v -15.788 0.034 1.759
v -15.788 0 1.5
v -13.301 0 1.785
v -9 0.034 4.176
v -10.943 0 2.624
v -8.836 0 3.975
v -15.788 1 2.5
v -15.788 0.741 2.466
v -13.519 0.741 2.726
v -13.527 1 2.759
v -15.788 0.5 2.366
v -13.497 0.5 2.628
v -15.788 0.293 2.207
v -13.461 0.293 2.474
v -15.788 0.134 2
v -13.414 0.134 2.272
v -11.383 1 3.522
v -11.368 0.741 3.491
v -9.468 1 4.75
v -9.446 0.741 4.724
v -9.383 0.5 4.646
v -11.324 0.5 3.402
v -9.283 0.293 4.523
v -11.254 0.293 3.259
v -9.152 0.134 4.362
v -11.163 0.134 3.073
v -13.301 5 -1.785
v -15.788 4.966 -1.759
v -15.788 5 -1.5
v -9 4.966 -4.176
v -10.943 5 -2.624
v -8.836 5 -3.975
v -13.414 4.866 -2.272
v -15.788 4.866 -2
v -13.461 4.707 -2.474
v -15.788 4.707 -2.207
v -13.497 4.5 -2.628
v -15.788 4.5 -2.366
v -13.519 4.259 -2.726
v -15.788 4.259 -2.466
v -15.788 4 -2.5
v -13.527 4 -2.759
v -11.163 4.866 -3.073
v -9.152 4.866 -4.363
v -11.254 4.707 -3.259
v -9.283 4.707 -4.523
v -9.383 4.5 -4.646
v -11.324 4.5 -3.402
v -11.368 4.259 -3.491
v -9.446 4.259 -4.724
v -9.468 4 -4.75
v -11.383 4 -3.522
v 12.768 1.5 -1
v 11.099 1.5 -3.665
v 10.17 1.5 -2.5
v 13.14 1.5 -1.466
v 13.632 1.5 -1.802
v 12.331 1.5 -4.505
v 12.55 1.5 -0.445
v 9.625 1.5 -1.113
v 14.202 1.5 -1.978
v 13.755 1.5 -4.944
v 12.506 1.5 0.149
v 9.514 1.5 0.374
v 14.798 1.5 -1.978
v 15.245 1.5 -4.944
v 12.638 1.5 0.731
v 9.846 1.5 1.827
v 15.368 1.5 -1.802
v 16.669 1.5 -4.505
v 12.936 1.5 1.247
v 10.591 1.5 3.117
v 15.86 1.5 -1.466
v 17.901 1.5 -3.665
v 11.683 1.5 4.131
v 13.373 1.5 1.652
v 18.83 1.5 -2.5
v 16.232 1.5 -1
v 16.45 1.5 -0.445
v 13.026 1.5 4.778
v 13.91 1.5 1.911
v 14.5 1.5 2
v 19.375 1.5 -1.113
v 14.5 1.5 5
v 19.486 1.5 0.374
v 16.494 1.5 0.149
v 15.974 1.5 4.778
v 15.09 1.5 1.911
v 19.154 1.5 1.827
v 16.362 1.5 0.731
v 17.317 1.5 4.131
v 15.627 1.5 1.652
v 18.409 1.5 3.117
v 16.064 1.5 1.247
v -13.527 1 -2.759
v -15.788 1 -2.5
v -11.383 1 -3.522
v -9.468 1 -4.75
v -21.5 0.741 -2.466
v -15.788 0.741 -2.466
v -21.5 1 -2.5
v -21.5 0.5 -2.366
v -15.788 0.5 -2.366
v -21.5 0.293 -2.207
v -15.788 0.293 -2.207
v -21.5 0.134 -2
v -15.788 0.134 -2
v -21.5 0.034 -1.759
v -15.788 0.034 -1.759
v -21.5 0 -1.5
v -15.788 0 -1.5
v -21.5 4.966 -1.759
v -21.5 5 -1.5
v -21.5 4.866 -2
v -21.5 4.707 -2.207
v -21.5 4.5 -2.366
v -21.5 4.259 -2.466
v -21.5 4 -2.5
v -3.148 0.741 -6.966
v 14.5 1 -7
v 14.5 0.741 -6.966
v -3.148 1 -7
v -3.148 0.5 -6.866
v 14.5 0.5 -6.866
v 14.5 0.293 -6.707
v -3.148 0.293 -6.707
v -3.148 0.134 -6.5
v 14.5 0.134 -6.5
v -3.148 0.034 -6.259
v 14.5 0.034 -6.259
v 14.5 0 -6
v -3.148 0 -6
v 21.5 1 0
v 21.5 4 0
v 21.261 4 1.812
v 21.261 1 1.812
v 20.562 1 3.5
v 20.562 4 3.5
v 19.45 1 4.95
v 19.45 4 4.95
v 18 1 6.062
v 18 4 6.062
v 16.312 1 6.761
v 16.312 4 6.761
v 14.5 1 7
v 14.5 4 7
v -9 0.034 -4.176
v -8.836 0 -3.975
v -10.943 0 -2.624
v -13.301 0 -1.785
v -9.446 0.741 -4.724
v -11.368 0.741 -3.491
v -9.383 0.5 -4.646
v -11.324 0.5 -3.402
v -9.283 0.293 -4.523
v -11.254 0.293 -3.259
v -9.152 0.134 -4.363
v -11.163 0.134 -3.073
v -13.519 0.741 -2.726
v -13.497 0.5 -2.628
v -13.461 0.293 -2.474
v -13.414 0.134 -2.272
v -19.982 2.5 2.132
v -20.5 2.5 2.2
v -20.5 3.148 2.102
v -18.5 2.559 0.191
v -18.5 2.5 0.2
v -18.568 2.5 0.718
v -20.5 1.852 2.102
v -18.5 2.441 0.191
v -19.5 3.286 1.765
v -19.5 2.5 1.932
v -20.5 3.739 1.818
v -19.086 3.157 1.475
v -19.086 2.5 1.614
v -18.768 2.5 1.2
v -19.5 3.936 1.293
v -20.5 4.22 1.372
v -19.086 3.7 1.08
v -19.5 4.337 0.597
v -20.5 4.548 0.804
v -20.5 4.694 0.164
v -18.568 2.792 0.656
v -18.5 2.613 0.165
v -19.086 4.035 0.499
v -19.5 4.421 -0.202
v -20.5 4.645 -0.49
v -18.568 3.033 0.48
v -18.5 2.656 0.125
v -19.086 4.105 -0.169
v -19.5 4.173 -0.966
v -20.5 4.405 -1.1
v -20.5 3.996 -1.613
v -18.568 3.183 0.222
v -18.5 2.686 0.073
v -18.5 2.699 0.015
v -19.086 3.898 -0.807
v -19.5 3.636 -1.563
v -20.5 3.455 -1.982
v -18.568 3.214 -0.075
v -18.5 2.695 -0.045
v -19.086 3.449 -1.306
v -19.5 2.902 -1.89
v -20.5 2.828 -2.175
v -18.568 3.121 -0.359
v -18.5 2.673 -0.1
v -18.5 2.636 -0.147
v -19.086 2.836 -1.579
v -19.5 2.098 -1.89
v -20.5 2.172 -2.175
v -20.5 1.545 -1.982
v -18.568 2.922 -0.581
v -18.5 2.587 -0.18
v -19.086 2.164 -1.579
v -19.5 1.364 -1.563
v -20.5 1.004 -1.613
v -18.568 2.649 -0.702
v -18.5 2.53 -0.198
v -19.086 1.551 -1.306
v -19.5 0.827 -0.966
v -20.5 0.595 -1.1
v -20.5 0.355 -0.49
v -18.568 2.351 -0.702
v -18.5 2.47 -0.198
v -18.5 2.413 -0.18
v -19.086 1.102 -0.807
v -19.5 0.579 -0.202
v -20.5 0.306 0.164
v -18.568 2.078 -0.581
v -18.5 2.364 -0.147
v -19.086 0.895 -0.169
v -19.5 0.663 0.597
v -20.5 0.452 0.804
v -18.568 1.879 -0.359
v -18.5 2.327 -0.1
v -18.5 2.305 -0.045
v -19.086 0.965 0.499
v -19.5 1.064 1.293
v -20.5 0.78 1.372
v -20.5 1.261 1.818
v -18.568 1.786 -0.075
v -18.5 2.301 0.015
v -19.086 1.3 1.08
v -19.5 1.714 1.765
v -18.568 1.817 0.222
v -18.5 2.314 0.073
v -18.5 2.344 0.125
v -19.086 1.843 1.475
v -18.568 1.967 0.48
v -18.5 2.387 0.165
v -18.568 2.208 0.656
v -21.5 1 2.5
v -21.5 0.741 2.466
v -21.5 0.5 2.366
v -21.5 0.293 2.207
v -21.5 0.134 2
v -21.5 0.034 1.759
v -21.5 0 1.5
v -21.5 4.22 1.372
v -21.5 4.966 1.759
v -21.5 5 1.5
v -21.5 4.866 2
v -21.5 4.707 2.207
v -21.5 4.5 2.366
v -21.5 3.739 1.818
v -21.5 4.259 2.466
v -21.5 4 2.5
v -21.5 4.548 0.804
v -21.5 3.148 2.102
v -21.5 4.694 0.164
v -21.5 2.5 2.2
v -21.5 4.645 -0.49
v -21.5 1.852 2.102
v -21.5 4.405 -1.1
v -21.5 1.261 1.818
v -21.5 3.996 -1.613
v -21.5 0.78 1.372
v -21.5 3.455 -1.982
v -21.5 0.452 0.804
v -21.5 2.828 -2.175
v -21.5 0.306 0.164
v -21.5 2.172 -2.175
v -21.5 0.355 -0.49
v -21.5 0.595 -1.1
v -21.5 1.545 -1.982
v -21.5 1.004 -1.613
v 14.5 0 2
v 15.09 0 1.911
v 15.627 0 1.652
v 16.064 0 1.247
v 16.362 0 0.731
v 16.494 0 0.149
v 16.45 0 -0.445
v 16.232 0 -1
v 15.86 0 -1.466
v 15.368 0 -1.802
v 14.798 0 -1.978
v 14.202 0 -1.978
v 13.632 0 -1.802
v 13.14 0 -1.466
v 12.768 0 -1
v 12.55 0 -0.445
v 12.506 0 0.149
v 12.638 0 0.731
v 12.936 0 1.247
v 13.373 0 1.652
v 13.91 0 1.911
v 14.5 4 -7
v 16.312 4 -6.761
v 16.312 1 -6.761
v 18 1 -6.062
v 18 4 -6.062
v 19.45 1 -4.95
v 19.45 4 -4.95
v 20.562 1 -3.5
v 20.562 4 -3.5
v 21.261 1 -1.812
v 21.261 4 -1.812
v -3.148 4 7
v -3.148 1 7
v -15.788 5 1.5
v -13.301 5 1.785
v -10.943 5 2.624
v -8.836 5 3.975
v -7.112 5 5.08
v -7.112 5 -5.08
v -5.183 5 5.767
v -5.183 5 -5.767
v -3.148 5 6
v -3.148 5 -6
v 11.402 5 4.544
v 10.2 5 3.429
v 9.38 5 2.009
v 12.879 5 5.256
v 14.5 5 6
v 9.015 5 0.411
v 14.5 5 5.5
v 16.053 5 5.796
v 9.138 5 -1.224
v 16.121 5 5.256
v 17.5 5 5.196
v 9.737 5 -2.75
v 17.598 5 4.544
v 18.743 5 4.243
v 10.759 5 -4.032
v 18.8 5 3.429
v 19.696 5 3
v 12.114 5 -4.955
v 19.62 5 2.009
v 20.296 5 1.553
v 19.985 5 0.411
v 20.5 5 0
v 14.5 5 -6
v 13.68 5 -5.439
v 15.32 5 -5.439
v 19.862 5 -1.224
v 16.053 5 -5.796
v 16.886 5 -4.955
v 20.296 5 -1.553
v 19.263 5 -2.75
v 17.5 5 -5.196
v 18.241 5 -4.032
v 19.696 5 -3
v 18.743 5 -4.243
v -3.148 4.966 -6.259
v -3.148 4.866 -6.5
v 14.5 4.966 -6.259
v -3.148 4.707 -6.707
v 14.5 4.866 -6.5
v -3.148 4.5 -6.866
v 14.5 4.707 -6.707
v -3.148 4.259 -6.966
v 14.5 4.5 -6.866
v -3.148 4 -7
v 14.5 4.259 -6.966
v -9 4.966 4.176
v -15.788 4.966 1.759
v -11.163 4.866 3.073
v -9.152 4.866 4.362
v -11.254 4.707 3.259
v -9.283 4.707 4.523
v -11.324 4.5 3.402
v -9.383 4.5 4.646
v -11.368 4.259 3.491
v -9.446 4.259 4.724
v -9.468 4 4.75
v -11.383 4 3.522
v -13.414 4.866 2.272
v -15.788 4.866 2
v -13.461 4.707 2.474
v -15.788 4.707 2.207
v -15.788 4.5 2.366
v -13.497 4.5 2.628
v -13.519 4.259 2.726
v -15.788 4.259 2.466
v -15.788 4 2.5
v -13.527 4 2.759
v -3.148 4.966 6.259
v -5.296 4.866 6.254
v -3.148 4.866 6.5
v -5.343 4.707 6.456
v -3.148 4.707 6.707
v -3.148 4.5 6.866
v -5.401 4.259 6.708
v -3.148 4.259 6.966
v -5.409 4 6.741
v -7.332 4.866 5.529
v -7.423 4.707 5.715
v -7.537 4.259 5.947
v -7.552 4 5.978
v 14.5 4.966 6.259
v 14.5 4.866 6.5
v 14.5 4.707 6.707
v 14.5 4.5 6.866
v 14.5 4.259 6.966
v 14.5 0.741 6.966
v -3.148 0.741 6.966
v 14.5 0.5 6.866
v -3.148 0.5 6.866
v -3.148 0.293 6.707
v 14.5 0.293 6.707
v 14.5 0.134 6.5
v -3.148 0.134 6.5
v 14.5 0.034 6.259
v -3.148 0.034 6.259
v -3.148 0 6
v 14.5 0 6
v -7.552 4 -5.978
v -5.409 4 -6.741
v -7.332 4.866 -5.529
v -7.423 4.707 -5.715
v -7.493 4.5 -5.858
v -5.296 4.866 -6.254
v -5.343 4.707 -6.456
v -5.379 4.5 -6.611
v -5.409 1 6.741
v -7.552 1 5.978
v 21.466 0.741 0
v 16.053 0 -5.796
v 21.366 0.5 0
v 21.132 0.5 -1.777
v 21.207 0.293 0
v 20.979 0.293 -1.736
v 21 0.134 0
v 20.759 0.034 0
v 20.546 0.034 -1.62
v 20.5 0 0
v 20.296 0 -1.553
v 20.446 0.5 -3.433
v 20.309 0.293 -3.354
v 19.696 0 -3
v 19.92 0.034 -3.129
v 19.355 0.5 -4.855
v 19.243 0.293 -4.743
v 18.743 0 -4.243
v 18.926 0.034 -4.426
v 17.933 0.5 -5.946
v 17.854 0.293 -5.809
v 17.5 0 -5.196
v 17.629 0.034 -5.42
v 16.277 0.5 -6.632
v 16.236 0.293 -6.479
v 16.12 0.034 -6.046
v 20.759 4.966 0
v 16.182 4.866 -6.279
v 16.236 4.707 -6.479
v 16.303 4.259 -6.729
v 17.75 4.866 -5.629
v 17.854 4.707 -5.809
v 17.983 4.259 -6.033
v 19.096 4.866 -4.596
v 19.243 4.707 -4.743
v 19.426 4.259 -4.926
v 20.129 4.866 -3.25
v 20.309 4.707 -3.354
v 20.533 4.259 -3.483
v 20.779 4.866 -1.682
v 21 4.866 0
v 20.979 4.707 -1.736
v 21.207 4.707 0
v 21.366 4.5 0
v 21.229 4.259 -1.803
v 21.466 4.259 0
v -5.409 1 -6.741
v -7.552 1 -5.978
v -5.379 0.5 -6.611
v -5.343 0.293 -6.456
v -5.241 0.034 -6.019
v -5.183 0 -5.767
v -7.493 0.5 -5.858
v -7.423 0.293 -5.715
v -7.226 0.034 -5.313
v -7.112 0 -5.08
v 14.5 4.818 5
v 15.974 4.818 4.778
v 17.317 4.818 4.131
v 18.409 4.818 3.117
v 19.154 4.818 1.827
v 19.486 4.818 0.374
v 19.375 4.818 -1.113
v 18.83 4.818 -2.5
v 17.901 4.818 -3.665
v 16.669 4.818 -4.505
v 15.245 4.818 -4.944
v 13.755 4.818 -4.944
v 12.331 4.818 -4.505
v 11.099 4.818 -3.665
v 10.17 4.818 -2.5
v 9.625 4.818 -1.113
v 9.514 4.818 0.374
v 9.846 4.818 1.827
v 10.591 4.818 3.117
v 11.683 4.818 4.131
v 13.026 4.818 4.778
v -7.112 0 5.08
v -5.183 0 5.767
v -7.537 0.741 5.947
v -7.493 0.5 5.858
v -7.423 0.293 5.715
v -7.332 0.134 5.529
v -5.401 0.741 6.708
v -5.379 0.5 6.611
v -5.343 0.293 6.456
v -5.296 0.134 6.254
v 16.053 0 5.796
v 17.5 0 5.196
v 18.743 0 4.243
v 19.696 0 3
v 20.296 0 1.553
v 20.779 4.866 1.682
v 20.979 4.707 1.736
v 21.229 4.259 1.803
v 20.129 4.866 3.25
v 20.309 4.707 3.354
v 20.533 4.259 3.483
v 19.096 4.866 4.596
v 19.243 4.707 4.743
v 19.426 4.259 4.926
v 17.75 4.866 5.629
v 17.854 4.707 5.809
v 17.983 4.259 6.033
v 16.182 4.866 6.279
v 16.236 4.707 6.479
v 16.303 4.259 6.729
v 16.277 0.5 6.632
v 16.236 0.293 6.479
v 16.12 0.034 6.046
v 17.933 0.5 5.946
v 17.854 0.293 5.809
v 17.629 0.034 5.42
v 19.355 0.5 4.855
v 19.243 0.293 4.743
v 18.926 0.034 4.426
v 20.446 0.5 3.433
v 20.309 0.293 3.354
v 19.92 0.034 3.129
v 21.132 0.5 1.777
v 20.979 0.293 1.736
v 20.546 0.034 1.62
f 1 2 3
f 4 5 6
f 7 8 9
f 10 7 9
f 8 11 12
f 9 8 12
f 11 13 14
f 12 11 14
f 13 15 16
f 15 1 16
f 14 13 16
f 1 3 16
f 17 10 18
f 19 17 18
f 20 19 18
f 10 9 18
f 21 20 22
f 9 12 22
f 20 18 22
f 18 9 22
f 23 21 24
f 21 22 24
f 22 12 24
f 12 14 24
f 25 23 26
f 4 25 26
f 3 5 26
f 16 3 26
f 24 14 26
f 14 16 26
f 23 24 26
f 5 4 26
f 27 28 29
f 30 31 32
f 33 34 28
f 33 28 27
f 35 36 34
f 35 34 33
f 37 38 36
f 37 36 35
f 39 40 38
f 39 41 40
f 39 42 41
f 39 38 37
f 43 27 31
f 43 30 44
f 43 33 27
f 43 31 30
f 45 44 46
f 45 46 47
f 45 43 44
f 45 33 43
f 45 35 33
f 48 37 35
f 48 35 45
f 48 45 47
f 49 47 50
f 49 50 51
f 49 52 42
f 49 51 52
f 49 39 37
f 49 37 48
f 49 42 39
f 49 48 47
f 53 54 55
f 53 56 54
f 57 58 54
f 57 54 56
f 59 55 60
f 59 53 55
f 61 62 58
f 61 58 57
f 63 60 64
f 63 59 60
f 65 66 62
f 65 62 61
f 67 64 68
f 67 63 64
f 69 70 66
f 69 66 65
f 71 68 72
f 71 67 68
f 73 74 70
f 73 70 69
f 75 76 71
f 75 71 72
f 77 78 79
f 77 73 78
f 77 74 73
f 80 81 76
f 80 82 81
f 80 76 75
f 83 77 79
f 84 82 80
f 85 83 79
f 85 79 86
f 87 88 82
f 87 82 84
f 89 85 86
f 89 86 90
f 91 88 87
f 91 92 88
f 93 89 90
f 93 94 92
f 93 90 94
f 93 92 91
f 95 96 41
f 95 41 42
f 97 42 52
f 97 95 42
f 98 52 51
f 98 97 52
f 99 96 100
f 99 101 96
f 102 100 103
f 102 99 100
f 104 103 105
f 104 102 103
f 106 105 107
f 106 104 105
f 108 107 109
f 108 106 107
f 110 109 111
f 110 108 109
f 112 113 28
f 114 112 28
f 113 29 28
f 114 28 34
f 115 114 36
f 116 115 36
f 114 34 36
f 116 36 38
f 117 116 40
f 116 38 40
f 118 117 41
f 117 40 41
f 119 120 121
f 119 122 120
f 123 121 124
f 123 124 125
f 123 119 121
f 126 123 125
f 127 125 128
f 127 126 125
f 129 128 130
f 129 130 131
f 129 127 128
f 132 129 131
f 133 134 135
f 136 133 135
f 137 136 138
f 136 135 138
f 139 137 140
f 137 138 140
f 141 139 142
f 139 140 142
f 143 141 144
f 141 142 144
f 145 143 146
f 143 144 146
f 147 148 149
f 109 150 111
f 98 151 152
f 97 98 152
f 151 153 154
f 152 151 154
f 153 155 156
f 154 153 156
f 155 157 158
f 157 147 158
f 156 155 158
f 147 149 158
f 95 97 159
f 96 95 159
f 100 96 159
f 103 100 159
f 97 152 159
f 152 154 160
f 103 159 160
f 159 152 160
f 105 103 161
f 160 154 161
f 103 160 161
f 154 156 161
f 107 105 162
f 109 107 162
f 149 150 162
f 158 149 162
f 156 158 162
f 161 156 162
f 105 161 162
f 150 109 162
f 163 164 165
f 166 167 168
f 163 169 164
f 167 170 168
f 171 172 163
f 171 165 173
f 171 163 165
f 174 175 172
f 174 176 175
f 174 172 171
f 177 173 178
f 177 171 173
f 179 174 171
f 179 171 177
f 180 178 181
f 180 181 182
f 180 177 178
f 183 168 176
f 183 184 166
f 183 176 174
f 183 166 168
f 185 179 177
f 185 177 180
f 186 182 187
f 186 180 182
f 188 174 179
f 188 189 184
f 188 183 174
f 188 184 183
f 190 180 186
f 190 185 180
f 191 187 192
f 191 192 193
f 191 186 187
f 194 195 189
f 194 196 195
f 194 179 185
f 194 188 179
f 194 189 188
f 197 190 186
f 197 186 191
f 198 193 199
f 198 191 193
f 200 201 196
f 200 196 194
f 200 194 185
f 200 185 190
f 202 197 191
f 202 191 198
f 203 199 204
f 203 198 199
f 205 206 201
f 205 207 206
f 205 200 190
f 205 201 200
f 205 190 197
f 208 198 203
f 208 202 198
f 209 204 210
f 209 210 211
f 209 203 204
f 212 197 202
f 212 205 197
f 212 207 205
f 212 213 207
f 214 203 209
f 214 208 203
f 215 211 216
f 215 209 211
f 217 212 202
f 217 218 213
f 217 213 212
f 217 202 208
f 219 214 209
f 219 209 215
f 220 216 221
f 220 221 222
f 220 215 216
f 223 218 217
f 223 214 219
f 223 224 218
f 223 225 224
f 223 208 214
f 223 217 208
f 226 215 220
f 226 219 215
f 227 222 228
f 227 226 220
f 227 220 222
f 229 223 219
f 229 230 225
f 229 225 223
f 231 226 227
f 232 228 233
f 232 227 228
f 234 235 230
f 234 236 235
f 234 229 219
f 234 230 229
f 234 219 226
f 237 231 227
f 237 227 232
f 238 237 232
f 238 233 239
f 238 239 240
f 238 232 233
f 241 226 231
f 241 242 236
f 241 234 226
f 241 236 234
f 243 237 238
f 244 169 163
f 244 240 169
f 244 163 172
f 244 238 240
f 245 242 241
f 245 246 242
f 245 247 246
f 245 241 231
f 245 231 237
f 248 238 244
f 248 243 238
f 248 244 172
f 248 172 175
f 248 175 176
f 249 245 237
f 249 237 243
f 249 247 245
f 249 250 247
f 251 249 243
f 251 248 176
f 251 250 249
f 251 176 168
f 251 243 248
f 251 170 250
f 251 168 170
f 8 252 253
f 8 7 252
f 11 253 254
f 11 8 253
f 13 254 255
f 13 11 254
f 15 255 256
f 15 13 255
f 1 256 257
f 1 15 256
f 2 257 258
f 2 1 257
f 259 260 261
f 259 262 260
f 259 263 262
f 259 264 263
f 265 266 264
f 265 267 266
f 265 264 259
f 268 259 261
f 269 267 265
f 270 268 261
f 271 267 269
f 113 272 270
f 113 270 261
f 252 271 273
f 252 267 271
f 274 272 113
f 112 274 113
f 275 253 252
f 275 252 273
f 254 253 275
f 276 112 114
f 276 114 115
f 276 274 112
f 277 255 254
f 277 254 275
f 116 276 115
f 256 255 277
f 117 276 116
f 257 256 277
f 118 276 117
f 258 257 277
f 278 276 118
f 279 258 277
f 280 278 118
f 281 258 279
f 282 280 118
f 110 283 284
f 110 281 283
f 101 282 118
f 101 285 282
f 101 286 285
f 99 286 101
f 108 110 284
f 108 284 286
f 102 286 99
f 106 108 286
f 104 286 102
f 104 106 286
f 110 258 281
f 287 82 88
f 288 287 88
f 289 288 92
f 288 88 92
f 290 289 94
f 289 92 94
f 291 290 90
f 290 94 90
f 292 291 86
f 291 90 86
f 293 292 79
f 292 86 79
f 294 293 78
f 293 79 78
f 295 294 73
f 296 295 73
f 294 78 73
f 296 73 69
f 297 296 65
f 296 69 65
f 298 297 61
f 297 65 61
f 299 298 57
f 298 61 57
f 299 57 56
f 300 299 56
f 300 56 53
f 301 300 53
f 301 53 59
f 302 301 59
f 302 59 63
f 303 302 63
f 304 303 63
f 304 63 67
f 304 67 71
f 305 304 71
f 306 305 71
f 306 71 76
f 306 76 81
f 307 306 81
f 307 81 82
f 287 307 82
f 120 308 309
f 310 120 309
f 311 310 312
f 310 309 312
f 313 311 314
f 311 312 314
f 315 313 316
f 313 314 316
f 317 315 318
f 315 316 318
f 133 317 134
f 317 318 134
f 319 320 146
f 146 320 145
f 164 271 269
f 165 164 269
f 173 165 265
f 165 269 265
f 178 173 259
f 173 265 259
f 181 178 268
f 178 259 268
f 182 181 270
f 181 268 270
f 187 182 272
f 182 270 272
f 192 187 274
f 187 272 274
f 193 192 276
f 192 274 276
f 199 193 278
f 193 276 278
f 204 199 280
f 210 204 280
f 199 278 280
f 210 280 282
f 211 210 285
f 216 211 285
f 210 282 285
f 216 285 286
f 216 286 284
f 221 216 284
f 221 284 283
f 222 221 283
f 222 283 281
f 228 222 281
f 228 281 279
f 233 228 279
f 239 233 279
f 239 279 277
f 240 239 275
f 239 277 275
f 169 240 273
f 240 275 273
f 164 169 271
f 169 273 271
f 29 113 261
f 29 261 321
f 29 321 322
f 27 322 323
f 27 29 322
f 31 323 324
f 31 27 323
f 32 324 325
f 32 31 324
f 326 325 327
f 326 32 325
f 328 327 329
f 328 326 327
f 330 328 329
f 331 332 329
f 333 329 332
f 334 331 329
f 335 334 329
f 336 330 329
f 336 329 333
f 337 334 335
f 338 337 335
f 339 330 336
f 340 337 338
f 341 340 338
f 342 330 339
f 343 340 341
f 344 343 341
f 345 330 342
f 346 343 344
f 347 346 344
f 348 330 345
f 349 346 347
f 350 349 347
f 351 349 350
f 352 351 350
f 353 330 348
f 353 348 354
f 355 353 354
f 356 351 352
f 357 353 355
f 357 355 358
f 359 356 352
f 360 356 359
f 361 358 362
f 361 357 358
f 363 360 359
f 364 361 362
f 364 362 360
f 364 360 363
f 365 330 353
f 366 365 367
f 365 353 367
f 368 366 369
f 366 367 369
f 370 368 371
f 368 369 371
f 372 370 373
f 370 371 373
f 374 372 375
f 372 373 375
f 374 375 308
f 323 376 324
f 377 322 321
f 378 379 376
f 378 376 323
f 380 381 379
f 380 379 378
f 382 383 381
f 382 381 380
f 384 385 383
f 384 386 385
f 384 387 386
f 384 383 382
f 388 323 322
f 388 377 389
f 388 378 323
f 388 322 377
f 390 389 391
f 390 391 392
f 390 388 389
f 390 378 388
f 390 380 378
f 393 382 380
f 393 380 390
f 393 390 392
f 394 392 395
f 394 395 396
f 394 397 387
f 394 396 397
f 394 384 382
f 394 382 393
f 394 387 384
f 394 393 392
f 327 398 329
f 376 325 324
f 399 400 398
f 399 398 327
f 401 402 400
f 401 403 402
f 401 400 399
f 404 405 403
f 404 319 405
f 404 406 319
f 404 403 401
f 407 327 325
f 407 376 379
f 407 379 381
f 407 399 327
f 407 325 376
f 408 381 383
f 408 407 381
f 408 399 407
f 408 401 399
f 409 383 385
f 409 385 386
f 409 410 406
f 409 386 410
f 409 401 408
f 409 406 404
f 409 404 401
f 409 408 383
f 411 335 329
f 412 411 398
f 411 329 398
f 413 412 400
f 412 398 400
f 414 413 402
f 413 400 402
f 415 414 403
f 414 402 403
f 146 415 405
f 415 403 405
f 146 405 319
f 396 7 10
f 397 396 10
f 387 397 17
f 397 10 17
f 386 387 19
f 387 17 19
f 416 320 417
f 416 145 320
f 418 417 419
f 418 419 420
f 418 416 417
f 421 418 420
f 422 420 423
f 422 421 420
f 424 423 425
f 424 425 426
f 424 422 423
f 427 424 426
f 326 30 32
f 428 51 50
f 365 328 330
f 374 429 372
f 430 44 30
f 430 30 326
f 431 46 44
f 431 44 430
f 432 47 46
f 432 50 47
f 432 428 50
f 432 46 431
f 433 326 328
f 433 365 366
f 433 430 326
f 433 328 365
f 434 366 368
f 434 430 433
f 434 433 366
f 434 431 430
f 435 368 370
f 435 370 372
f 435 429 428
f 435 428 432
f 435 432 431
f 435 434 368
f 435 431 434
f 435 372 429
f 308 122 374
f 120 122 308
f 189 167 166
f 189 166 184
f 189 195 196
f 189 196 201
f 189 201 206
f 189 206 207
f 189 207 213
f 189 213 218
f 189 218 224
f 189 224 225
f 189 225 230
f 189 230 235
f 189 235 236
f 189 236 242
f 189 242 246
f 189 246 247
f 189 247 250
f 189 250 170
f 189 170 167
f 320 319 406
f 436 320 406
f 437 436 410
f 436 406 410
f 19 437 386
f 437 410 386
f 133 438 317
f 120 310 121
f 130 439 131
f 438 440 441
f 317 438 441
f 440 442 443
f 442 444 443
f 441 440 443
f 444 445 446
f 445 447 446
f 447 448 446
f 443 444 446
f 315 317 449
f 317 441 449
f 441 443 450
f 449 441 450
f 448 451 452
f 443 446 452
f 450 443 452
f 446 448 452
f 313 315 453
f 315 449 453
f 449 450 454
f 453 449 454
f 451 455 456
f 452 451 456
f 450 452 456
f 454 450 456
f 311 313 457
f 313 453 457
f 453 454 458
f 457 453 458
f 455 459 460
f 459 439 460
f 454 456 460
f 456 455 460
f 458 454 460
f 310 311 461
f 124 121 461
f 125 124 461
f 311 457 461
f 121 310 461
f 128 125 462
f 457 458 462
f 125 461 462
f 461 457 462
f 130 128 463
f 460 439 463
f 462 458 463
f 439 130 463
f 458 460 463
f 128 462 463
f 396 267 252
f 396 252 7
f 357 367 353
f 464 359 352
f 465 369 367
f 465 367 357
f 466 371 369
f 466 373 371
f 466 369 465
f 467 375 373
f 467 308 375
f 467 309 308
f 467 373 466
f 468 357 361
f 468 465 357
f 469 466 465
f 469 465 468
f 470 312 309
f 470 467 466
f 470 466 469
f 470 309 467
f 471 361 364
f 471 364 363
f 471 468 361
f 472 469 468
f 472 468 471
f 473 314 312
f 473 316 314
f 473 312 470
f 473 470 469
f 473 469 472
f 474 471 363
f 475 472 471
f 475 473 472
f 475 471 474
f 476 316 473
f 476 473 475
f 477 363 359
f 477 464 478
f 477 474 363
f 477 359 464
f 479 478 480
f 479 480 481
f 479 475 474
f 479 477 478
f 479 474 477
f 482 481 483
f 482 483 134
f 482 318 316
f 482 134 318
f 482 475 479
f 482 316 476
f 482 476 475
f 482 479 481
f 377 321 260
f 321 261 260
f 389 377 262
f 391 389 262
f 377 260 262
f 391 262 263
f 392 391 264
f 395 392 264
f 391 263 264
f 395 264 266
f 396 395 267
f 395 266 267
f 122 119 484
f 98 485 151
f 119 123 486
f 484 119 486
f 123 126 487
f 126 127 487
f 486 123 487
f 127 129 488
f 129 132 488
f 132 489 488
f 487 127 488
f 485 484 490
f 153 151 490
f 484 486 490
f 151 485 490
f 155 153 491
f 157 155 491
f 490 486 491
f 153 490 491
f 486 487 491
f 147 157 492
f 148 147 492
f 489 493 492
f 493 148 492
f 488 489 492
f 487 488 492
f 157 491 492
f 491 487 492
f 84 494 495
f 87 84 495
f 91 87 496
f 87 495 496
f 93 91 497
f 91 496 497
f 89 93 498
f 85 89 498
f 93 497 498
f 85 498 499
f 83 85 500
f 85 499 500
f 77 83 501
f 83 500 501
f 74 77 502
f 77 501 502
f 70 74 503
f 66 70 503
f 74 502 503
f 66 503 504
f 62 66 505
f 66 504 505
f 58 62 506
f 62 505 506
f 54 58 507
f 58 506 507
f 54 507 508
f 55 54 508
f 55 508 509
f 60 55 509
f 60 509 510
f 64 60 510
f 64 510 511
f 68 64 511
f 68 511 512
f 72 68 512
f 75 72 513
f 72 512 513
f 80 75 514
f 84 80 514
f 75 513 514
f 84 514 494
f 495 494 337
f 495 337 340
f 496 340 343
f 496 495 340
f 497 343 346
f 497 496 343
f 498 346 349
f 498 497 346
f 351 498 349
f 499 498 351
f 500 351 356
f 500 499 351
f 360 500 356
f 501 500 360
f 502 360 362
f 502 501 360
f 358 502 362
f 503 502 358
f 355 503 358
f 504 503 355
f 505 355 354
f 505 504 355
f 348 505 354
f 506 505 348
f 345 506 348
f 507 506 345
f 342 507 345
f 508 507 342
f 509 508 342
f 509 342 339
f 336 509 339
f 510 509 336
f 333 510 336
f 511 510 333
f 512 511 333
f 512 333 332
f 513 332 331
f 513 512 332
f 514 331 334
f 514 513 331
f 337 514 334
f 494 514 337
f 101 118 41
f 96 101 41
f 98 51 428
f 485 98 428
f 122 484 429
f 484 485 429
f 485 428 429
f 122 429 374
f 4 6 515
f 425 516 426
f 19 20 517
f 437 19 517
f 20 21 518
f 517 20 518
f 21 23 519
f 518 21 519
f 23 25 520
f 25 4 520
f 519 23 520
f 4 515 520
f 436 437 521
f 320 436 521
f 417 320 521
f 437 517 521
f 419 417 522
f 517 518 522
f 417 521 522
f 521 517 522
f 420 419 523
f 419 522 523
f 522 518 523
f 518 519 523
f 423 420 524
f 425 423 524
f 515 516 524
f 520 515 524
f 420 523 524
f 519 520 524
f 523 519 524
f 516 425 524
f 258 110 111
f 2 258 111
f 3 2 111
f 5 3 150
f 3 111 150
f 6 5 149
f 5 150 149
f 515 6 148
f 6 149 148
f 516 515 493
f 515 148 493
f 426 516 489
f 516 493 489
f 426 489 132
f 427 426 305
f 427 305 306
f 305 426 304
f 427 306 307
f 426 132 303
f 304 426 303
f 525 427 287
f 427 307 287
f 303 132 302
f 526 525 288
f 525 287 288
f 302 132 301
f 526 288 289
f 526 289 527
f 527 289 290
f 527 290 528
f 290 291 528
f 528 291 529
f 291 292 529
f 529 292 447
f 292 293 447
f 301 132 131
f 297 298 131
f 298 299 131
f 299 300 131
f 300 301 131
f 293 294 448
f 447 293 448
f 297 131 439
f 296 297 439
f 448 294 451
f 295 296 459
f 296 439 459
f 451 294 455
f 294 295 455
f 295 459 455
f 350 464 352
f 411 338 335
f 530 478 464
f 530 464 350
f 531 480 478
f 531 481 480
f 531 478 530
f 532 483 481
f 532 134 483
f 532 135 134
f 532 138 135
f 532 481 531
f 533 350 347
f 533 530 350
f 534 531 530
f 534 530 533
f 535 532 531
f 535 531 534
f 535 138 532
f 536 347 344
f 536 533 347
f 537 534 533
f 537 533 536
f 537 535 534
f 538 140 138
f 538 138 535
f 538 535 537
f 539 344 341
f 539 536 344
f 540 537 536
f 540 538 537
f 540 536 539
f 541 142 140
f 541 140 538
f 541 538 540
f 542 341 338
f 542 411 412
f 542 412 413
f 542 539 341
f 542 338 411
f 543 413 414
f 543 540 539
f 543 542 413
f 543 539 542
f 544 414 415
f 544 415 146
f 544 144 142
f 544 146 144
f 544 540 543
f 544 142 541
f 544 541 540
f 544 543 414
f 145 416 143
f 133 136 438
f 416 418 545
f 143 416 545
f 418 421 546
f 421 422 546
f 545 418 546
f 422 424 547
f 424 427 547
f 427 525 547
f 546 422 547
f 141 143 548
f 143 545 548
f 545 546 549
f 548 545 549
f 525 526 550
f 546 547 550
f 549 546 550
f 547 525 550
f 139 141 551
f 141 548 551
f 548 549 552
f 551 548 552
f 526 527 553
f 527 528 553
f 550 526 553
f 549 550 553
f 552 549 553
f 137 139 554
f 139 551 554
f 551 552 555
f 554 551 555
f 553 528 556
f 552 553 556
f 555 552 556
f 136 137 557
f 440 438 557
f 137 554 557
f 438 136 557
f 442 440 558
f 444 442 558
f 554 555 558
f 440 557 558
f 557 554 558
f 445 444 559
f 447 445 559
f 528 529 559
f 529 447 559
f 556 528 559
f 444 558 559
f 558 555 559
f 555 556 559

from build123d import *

# Parameters (mm, degrees)
SKETCH_2_W          = 43
SKETCH_2_H          = 14
EXTRUDE_1_DEPTH     = 5
SKETCH_6_R          = 5
CUT_EXTRUDE_4_DEPTH = 3.5
SKETCH_7_W          = 10
SKETCH_7_H          = 4.5
CUT_EXTRUDE_5_DEPTH = 10
FILLET_1_R          = 10
FILLET_2_R          = 10
FILLET_4_R          = 7
CHAMFER_1_SIZE      = 0.5
CHAMFER_1_SIZE2     = 0.181985117
FILLET_3_R          = 1
SKETCH_8_R          = 2.2
CUT_EXTRUDE_6_DEPTH = 3
FILLET_5_R          = 2
SKETCH_9_R          = 2
CUT_EXTRUDE_7_DEPTH = 4


# Some blends are built 0.0001 mm under size
with BuildPart() as part:
    # Эскиз2 → Бобышка-Вытянуть1 (new body)
    with BuildSketch(Plane(origin=(0, 0, 0), x_dir=(1, 0, 0), z_dir=(0, 1, 0))):
        Rectangle(SKETCH_2_W, SKETCH_2_H)
    extrude(amount=EXTRUDE_1_DEPTH)

    # Эскиз6 → Вырез-Вытянуть4 (cut)
    with BuildSketch(Plane(origin=(0, 5, 0), x_dir=(1, 0, 0), z_dir=(0, 1, 0))):
        with Locations(Location((14.5, 0, 0), (0, 0, 270))):
            Circle(SKETCH_6_R)
    extrude(amount=-CUT_EXTRUDE_4_DEPTH, mode=Mode.SUBTRACT)

    # Эскиз7 → Вырез-Вытянуть5 (cut)
    with BuildSketch(Plane(origin=(0, 5, 0), x_dir=(1, 0, 0), z_dir=(0, 1, 0))):
        with Locations((-16.5, -4.75)):
            Rectangle(SKETCH_7_W, SKETCH_7_H)
        with Locations((-16.5, 4.75)):
            Rectangle(SKETCH_7_W, SKETCH_7_H)
    extrude(amount=-CUT_EXTRUDE_5_DEPTH, mode=Mode.SUBTRACT)

    # Скругление1
    # the kernel refuses this fillet: 10 mm, written as the material it takes off along each edge
    with BuildSketch(Plane(origin=(-11.5, 25.879116361, 7), x_dir=(1, 0, 0), z_dir=(0, -1, 0))) as fillet_1_piece_1:
        with BuildLine():
            CenterArc((8.351646544, -10), FILLET_1_R, 90, 56.632987031)
            Line((0, -4.5), (-0.167032931, -4.39))
            ThreePointArc((-0.167032931, -4.39), (-0.2, -2.25), (-0.2, 0))
            Line((-0.2, 0), (0, 0.2))
            Line((0, 0.2), (8.351646544, 0.2))
            Line((8.351646544, 0.2), (8.351646544, 0))
        make_face()
    extrude(amount=46.758232721, mode=Mode.SUBTRACT)
    with BuildSketch(Plane(origin=(-11.5, 25.879116361, -7), x_dir=(1.535167055204576e-12, 0, 1.0), z_dir=(0, -1, 0))) as fillet_1_piece_2:
        with BuildLine():
            CenterArc((10, -8.351646544), FILLET_1_R, 123.367012969, 56.632987031)
            Line((0, -8.351646544), (-0.2, -8.351646544))
            Line((-0.2, -8.351646544), (-0.2, 0))
            Line((-0.2, 0), (0, 0.2))
            ThreePointArc((0, 0.2), (2.25, 0.2), (4.39, 0.167032931))
            Line((4.39, 0.167032931), (4.5, 0))
        make_face()
    extrude(amount=46.758232721, mode=Mode.SUBTRACT)

    # Скругление2
    fillet_2_edges = [part.edges().sort_by_distance(p)[0] for p in [
        (-11.5, 2.5, -2.5),
        (-11.5, 2.5, 2.5),
    ]]
    fillet(fillet_2_edges, radius=FILLET_2_R)

    # Скругление4
    fillet_4_edges = [part.edges().sort_by_distance(p)[0] for p in [
        (21.5, 2.5, -7),
        (21.5, 2.5, 7),
    ]]
    fillet(fillet_4_edges, radius=FILLET_4_R - 0.0001)  # a hair under: the kernel refuses the full size

    # Фаска1
    chamfer_1_edges = [part.edges().sort_by_distance(p)[0] for p in [
        (14.5, 5, -5),
    ]]
    chamfer_1_side = [part.faces().sort_by_distance(p)[0] for p in [
        (0.230514486, 5, 0),
    ]]
    chamfer(chamfer_1_edges, length=CHAMFER_1_SIZE, length2=CHAMFER_1_SIZE2, reference=chamfer_1_side[0])

    # Скругление3
    fillet_3_edges = [part.edges().sort_by_distance(p)[0] for p in [
        (-18.643789058, 0, 2.5),
        (-18.643789058, 5, -2.5),
        (5.675873272, 5, 7),
        (-6.502455422, 5, -6.420721841),
        (5.675873272, 0, 7),
        (-6.502455422, 0, 6.420721841),
        (-6.502455422, 0, -6.420721841),
        (-18.643789058, 0, -2.5),
        (-18.643789058, 5, 2.5),
        (-6.502455422, 5, 6.420721841),
        (-12.433476149, 5, -3.079278159),
        (-12.433476149, 0, -3.079278159),
        (-12.433476149, 5, 3.079278159),
        (-12.433476149, 0, 3.079278159),
        (5.675873272, 0, -7),
        (5.675873272, 5, -7),
        (19.449776758, 0, 4.949776758),
        (19.449776758, 0, -4.949776758),
        (19.449776758, 5, 4.949776758),
        (19.449776758, 5, -4.949776758),
    ]]
    fillet(fillet_3_edges, radius=FILLET_3_R)

    # Эскиз8 → Вырез-Вытянуть6 (cut)
    with BuildSketch(Plane.ZY.offset(21.5)):
        with Locations((0, 2.5)):
            Circle(SKETCH_8_R)
    extrude(amount=-CUT_EXTRUDE_6_DEPTH, mode=Mode.SUBTRACT)

    # Скругление5
    fillet_5_edges = [part.edges().sort_by_distance(p)[0] for p in [
        (-18.5, 2.5, -2.2),
    ]]
    fillet(fillet_5_edges, radius=FILLET_5_R)

    # Эскиз9 → Вырез-Вытянуть7 (cut)
    with BuildSketch(Plane(origin=(0, 1.5, 0), x_dir=(1, 0, 0), z_dir=(0, 1, 0))):
        with Locations(Location((14.5, 0, 0), (0, 0, 270))):
            Circle(SKETCH_9_R)
    extrude(amount=-CUT_EXTRUDE_7_DEPTH, mode=Mode.SUBTRACT)


solid = part.part
